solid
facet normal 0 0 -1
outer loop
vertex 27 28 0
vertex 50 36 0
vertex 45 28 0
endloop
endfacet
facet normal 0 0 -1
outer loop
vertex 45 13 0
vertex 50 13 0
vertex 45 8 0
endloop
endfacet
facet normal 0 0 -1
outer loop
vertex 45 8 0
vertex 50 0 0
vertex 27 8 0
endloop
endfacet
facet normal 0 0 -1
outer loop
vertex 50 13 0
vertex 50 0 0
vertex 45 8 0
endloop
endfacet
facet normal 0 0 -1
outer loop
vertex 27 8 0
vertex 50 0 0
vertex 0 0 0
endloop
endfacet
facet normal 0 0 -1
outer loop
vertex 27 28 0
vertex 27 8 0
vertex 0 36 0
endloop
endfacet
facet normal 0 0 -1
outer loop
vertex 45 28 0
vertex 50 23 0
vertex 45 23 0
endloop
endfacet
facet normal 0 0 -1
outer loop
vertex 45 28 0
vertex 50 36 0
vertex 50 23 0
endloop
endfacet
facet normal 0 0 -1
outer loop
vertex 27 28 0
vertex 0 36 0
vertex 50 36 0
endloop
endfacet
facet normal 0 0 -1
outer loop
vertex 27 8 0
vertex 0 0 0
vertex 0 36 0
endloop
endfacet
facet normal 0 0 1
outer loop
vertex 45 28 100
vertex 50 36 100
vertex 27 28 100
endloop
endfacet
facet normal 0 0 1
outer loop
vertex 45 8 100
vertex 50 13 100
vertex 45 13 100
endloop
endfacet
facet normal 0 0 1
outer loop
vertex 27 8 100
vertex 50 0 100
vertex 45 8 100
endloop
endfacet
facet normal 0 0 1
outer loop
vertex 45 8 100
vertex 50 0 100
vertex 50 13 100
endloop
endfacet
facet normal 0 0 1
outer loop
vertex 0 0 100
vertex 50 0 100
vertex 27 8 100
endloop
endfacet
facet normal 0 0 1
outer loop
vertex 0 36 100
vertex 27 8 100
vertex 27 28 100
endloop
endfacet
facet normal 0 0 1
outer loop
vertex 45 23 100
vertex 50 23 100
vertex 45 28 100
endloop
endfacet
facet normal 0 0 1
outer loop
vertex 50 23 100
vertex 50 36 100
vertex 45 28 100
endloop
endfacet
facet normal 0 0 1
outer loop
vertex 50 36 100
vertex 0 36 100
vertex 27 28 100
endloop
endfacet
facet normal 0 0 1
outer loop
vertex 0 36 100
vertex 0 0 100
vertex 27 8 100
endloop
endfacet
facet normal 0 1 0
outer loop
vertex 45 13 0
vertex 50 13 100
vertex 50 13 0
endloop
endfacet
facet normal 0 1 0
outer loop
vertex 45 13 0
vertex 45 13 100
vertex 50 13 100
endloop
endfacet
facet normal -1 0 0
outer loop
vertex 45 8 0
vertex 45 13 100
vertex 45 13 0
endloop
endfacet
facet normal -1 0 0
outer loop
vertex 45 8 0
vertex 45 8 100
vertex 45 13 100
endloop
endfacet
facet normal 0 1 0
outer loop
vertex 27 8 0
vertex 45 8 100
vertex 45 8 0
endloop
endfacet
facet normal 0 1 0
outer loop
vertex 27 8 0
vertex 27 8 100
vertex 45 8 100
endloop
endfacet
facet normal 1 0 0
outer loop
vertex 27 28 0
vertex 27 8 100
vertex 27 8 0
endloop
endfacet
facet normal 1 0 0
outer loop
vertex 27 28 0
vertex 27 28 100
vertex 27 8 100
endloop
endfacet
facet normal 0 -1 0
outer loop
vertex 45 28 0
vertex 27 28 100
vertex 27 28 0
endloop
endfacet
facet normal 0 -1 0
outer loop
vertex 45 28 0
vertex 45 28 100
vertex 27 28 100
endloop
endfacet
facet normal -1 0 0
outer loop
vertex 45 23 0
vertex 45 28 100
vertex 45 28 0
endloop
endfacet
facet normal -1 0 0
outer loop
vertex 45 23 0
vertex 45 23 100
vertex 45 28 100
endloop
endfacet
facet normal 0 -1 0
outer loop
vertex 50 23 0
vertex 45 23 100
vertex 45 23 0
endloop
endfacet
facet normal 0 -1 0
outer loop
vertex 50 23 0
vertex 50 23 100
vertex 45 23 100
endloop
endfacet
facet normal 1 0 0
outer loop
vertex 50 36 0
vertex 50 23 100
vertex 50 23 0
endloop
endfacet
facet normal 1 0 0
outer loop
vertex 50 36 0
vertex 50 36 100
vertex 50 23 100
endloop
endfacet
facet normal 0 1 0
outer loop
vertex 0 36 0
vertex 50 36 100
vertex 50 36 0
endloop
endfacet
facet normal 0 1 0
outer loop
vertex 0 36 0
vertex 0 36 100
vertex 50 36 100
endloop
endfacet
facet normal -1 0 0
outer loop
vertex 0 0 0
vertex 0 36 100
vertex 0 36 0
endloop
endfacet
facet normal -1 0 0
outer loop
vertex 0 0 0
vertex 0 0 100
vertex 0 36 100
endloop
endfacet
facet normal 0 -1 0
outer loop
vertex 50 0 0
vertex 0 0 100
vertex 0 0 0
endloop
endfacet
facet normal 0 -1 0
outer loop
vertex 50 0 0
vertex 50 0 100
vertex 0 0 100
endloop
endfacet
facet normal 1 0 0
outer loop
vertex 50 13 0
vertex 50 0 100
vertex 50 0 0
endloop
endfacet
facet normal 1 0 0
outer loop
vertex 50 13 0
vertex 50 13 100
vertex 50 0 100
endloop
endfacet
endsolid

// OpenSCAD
$fn = 32;

// ----------------------------------------------------------------------
// T-slot rail: 50 x 36 mm section, 100 mm long
// ----------------------------------------------------------------------

// --- parameters (mm) ---
profile_height = 100;     // extrusion height
profile_points = 12;      // points of the closed outline

profile = [[0, 0], [50, 0], [50, 13], [45, 13], [45, 8], [27, 8], [27, 28], [45, 28], [45, 23], [50, 23], [50, 36], [0, 36]];  // single closed polygon, 12 points, counter clockwise

// --- the one profile operation ---
linear_extrude(height = profile_height) polygon(points = profile);
